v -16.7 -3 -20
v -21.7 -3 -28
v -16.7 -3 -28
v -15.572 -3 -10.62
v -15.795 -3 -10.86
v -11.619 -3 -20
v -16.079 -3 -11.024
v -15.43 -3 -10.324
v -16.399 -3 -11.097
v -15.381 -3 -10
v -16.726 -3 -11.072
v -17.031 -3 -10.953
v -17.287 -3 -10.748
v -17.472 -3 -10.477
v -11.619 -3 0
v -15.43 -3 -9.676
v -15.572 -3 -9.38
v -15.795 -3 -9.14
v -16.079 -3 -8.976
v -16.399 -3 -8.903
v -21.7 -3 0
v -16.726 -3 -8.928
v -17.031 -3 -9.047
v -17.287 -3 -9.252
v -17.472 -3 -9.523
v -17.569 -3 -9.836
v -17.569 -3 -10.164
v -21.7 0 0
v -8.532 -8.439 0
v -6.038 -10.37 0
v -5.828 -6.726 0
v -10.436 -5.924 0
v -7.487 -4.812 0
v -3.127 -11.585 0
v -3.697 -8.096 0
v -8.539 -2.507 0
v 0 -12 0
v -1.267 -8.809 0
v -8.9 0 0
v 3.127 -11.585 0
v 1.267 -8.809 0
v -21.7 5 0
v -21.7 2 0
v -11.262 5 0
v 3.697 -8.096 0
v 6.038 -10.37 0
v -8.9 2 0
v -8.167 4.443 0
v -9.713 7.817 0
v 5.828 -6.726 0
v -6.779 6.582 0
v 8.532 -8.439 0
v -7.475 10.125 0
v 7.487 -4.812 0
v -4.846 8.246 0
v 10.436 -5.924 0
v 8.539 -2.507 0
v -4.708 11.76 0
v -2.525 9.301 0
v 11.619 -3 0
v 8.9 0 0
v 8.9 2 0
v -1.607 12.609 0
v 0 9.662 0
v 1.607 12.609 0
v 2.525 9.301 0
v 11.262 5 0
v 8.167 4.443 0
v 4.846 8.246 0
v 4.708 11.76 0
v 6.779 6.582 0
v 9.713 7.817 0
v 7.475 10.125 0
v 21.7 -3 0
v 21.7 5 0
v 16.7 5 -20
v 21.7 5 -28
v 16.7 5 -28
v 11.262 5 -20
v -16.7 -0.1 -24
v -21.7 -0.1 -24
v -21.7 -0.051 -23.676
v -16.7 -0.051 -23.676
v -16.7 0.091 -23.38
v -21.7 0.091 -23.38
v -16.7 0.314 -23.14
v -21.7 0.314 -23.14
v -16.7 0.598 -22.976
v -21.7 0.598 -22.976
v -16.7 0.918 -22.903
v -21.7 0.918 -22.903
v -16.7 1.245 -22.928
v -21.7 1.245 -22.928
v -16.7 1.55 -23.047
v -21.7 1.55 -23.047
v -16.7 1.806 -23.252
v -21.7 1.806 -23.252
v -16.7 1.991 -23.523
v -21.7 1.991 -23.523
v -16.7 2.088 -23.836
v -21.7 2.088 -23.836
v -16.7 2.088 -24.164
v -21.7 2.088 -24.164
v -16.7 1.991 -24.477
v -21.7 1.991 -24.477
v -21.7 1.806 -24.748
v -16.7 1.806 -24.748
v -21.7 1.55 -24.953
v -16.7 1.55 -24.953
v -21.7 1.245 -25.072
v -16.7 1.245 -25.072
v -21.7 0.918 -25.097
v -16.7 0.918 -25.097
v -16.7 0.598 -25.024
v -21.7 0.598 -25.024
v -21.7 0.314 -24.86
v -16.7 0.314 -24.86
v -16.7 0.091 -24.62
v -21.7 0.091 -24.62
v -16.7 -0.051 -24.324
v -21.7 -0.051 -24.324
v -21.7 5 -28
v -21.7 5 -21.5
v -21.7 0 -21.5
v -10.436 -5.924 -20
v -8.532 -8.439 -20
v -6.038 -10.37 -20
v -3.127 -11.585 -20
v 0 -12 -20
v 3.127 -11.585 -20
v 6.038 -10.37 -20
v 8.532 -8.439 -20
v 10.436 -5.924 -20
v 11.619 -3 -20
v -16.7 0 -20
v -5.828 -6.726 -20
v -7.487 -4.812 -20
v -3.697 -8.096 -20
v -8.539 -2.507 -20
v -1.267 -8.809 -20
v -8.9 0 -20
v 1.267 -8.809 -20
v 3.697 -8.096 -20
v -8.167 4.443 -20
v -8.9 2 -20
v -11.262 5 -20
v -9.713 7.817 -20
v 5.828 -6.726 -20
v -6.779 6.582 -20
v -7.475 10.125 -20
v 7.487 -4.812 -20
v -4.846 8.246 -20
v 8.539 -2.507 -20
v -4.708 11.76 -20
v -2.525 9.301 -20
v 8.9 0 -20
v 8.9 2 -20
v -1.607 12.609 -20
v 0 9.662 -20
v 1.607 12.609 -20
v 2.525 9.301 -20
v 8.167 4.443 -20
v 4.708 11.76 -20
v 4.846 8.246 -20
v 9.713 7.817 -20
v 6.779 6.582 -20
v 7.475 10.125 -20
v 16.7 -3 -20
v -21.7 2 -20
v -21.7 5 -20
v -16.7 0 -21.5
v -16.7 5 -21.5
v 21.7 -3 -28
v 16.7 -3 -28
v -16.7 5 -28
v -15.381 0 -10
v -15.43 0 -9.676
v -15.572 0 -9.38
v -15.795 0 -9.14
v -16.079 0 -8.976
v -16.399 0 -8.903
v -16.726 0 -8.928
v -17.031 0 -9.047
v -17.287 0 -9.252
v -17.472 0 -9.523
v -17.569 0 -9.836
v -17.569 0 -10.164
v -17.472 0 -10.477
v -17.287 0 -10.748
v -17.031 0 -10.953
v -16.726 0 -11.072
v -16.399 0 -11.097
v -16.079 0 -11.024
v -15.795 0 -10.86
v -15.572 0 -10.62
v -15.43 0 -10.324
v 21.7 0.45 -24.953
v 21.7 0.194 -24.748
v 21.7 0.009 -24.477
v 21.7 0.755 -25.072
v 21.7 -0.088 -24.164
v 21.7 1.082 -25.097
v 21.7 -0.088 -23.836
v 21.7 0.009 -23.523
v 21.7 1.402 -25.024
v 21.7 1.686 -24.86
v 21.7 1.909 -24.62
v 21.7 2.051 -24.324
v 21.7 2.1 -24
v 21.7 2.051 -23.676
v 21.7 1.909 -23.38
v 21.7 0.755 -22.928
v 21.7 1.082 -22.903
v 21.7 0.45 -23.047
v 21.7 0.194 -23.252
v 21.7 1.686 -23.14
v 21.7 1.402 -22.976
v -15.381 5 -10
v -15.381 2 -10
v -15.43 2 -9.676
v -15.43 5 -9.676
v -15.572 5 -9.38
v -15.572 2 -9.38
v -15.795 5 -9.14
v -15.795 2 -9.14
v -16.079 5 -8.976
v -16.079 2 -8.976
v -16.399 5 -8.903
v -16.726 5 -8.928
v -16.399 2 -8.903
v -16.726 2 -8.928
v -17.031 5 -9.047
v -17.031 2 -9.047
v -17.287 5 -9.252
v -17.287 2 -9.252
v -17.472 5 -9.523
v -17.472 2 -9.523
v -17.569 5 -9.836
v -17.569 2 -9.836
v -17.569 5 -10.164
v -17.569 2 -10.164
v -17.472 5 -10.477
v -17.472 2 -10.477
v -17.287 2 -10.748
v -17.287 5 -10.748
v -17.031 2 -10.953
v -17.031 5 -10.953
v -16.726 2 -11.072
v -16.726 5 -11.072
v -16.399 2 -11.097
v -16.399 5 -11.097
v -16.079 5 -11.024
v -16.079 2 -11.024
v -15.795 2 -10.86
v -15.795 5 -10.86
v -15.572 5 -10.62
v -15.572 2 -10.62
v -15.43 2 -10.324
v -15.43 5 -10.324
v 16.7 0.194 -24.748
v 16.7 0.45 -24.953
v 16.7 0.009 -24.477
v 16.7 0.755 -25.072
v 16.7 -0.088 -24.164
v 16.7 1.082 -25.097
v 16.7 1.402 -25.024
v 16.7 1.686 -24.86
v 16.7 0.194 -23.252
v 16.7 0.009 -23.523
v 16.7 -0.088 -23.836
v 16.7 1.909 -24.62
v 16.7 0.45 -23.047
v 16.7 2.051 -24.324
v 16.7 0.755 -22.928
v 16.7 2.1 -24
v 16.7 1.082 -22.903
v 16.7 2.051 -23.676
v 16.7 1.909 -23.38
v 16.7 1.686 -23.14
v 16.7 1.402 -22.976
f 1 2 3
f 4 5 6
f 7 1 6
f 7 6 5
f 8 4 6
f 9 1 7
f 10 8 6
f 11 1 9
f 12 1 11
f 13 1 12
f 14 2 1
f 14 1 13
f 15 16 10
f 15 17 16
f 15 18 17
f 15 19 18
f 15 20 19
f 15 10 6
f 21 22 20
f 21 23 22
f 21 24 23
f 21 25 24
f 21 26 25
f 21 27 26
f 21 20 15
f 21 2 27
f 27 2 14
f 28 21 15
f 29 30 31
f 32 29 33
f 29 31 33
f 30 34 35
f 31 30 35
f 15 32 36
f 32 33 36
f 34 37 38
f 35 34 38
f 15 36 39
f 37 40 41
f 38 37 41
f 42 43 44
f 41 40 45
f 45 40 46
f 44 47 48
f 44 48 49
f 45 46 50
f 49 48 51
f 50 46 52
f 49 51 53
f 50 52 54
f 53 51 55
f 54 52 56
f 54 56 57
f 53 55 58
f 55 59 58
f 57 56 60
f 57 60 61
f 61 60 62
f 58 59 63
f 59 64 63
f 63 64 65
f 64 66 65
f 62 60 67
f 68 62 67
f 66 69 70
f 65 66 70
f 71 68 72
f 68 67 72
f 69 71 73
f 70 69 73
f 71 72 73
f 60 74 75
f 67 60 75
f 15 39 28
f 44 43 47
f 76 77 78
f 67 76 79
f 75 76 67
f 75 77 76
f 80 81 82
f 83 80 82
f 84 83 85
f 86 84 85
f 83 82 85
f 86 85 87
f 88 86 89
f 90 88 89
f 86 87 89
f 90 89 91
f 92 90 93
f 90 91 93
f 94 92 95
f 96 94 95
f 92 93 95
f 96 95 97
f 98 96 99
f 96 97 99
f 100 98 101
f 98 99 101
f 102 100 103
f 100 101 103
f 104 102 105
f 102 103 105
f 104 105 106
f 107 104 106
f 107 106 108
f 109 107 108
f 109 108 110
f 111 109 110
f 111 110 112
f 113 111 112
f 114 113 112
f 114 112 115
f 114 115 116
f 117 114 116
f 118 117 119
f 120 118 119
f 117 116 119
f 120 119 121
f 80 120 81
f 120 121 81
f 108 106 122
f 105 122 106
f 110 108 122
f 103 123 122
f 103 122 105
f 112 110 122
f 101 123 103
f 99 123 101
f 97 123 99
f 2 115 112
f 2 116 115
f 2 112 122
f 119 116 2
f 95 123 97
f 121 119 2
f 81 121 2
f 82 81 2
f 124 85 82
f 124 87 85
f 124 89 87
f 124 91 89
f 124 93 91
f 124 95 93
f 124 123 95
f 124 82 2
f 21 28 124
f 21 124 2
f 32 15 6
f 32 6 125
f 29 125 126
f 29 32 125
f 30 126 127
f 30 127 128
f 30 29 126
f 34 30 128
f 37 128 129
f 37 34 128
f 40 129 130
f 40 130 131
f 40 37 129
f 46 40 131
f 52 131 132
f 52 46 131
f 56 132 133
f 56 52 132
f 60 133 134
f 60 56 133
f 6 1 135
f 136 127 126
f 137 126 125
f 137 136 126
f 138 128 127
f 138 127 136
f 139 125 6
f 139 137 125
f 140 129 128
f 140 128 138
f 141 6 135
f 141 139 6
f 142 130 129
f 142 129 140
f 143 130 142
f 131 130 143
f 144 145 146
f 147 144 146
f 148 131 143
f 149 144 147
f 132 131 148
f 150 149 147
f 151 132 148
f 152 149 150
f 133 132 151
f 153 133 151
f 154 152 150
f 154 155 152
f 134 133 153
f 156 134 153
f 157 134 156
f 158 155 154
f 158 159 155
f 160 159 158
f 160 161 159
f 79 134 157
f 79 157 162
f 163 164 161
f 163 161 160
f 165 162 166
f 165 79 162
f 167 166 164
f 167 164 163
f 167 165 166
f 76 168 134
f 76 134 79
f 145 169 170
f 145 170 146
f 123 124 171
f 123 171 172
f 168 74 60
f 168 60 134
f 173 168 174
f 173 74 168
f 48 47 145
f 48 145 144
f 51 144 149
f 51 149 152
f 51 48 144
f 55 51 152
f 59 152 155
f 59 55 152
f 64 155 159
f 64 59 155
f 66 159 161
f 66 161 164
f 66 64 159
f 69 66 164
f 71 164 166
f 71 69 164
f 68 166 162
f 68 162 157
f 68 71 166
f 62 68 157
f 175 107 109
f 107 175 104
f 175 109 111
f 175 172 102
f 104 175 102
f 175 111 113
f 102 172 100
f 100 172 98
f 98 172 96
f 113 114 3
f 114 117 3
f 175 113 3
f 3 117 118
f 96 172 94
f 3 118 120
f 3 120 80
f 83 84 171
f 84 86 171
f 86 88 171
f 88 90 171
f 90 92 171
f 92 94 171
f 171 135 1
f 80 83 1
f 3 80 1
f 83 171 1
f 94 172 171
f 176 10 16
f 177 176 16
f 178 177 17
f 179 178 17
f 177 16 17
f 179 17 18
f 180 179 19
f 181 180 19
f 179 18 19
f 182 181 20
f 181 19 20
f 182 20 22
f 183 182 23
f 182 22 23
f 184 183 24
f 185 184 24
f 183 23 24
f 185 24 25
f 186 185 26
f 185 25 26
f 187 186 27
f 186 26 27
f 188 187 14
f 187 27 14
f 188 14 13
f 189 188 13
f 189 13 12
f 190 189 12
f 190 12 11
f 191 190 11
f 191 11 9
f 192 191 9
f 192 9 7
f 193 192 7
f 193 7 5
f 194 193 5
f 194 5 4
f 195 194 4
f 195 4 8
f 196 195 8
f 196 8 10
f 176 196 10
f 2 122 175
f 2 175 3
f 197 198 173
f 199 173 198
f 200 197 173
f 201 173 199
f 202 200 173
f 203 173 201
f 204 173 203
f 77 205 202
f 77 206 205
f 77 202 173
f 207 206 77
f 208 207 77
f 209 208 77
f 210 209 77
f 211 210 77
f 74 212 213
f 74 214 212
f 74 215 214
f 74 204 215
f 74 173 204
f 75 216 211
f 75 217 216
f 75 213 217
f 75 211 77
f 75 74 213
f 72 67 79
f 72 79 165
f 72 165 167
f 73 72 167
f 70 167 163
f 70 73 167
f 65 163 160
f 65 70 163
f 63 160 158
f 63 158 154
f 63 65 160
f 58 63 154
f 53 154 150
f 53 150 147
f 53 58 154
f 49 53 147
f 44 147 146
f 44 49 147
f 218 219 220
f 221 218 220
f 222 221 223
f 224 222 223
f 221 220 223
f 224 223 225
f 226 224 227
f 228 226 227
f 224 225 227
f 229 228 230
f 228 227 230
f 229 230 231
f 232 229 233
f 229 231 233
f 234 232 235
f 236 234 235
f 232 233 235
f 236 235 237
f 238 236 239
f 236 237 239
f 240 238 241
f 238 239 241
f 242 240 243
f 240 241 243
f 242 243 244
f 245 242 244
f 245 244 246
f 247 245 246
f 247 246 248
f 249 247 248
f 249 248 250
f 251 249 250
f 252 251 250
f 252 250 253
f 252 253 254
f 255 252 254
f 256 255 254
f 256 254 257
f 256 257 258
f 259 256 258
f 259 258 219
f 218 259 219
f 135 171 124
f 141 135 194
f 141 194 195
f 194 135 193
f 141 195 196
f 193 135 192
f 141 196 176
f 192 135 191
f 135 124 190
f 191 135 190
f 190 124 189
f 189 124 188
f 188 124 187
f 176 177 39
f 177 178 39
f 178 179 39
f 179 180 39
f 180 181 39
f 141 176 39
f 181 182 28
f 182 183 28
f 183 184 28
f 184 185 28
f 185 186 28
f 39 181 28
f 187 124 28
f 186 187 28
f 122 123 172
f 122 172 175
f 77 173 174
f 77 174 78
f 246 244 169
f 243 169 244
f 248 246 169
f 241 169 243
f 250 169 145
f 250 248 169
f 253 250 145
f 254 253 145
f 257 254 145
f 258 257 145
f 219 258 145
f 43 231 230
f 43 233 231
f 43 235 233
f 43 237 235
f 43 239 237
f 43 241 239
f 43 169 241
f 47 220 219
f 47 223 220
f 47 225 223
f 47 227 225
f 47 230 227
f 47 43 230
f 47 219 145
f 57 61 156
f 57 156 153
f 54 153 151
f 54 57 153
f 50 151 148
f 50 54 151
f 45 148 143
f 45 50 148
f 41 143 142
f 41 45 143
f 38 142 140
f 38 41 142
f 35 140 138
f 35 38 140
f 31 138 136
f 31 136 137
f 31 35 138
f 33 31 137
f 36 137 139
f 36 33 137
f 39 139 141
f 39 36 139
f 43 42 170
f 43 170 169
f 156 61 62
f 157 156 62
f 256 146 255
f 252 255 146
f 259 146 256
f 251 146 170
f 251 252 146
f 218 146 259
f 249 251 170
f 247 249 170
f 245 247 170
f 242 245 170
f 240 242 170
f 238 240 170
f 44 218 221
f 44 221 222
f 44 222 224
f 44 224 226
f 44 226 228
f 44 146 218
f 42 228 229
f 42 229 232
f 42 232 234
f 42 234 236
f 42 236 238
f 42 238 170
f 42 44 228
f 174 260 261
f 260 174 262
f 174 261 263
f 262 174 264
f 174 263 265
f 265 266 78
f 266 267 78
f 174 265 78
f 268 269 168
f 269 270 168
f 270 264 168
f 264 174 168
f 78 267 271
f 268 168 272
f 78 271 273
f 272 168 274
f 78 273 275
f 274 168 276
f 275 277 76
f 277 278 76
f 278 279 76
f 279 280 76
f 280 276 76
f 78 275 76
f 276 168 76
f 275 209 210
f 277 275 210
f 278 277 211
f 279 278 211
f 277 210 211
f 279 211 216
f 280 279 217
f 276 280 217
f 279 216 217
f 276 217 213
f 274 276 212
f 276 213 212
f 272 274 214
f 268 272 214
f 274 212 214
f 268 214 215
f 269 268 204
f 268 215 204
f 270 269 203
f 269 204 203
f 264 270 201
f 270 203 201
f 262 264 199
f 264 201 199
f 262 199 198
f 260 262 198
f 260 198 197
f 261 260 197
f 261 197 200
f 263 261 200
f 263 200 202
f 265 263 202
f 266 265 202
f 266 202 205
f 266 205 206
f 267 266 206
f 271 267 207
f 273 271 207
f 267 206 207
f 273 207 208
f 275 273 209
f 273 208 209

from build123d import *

# Parameters (mm, degrees)
F1_DEPTH = 20
F4_DEPTH = 20
F2_W     = 2
F2_H     = 20
F5_DEPTH = 12.8
F2_R     = 1.1
F6_DEPTH = 5
F7_W     = 3
F7_H     = 1.5
F7_R     = 1.1
F8_DEPTH = 5
F10_D    = 2.2


with BuildPart() as f1:
    # F0 (on Top) → F1 (new body)
    with BuildSketch(Plane.XY):
        with BuildLine():
            Line((-8.9, -3), (-8.9, 0))
            Line((-8.9, 0), (-12, 0))
            ThreePointArc((-12, 0), (-11.9043563552, -1.5120515098), (-11.6189500386, -3))
            Line((-11.6189500386, -3), (-8.9, -3))
        make_face()
        with BuildLine():
            ThreePointArc((8.9, 0), (0, -8.9), (-8.9, 0))
            Line((-8.9, 0), (-8.9, -3))
            Line((-8.9, -3), (-11.6189500386, -3))
            ThreePointArc((-11.6189500386, -3), (0, -12), (11.6189500386, -3))
            Line((11.6189500386, -3), (8.9, -3))
            Line((8.9, -3), (8.9, 0))
        make_face()
        with BuildLine():
            Line((12, 0), (8.9, 0))
            Line((8.9, 0), (8.9, -3))
            Line((8.9, -3), (11.6189500386, -3))
            ThreePointArc((11.6189500386, -3), (11.9043563552, -1.5120515098), (12, 0))
        make_face()
        with BuildLine():
            ThreePointArc((-11.6189500386, -3), (-11.9043563552, -1.5120515098), (-12, 0))
            Line((-12, 0), (-21.7, 0))
            Line((-21.7, 0), (-21.7, -3))
            Line((-21.7, -3), (-11.6189500386, -3))
        make_face()
        with BuildLine():
            Line((21.7, 0), (12, 0))
            ThreePointArc((12, 0), (11.9043563552, -1.5120515098), (11.6189500386, -3))
            Line((11.6189500386, -3), (21.7, -3))
            Line((21.7, -3), (21.7, 0))
        make_face()
    extrude(amount=-F1_DEPTH)



with BuildPart() as f4:
    # F3 (on Top) → F4 (new body)
    with BuildSketch(Plane.XY):
        with BuildLine():
            Line((-21.7, 2), (-12, 2))
            ThreePointArc((-12, 2), (-11.7273581741, 3.5236938591), (-11.2620660942, 5))
            Line((-11.2620660942, 5), (-21.7, 5))
            Line((-21.7, 5), (-21.7, 2))
        make_face()
        with BuildLine():
            Line((-12, 2), (-8.9, 2))
            Line((-8.9, 2), (-8.9, 5))
            Line((-8.9, 5), (-11.2620660942, 5))
            ThreePointArc((-11.2620660942, 5), (-11.7273581741, 3.5236938591), (-12, 2))
        make_face()
        with BuildLine():
            ThreePointArc((-8.9, 2), (0, 9.662091184), (8.9, 2))
            Line((8.9, 2), (8.9, 5))
            Line((8.9, 5), (11.2620660942, 5))
            ThreePointArc((11.2620660942, 5), (0, 12.7159530528), (-11.2620660942, 5))
            Line((-11.2620660942, 5), (-8.9, 5))
            Line((-8.9, 5), (-8.9, 2))
        make_face()
        with BuildLine():
            ThreePointArc((11.2620660942, 5), (11.7273581741, 3.5236938591), (12, 2))
            Line((12, 2), (21.7, 2))
            Line((21.7, 2), (21.7, 5))
            Line((21.7, 5), (11.2620660942, 5))
        make_face()
        with BuildLine():
            Line((8.9, 5), (8.9, 2))
            Line((8.9, 2), (12, 2))
            ThreePointArc((12, 2), (11.7273581741, 3.5236938591), (11.2620660942, 5))
            Line((11.2620660942, 5), (8.9, 5))
        make_face()
    extrude(amount=-F4_DEPTH)


with BuildPart() as f1_1:
    add(f1.part)

    add(f4.part)  # F5 merges F4
    # F2 (on face) → F5 (join)
    with BuildSketch(Plane.YZ.offset(21.7)):
        with Locations((1, -10)):
            Rectangle(F2_W, F2_H)
    extrude(amount=-F5_DEPTH)

    # F2 (on face) → F6 (join)
    with BuildSketch(Plane.YZ.offset(21.7)):
        Polygon((2, -20), (0, -20), (-3, -20), (-3, -28), (5, -28), (5, -20), align=None)
        with Locations((1, -24)):
            Circle(F2_R, mode=Mode.SUBTRACT)
    extrude(amount=-F6_DEPTH)

    # F7 (on face) → F8 (join)
    with BuildSketch(Plane(origin=(-21.7, 0, 0), x_dir=(0, -1, 0), z_dir=(-1, 0, 0))):
        with Locations((1.5, -20.75)):
            Rectangle(F7_W, F7_H)
        Polygon((3, -28), (3, -21.5), (0, -21.5), (-5, -21.5), (-5, -28), align=None)
        with Locations((-1, -24)):
            Circle(F7_R, mode=Mode.SUBTRACT)
    extrude(amount=-F8_DEPTH)

    # F10 (through all)
    with Locations(Plane(origin=(0, 5, 0), x_dir=(-1, 0, 0), z_dir=(0, 1, 0))):
        with Locations((16.481, -10)):
            Hole(F10_D / 2)


solid = f1_1.part
